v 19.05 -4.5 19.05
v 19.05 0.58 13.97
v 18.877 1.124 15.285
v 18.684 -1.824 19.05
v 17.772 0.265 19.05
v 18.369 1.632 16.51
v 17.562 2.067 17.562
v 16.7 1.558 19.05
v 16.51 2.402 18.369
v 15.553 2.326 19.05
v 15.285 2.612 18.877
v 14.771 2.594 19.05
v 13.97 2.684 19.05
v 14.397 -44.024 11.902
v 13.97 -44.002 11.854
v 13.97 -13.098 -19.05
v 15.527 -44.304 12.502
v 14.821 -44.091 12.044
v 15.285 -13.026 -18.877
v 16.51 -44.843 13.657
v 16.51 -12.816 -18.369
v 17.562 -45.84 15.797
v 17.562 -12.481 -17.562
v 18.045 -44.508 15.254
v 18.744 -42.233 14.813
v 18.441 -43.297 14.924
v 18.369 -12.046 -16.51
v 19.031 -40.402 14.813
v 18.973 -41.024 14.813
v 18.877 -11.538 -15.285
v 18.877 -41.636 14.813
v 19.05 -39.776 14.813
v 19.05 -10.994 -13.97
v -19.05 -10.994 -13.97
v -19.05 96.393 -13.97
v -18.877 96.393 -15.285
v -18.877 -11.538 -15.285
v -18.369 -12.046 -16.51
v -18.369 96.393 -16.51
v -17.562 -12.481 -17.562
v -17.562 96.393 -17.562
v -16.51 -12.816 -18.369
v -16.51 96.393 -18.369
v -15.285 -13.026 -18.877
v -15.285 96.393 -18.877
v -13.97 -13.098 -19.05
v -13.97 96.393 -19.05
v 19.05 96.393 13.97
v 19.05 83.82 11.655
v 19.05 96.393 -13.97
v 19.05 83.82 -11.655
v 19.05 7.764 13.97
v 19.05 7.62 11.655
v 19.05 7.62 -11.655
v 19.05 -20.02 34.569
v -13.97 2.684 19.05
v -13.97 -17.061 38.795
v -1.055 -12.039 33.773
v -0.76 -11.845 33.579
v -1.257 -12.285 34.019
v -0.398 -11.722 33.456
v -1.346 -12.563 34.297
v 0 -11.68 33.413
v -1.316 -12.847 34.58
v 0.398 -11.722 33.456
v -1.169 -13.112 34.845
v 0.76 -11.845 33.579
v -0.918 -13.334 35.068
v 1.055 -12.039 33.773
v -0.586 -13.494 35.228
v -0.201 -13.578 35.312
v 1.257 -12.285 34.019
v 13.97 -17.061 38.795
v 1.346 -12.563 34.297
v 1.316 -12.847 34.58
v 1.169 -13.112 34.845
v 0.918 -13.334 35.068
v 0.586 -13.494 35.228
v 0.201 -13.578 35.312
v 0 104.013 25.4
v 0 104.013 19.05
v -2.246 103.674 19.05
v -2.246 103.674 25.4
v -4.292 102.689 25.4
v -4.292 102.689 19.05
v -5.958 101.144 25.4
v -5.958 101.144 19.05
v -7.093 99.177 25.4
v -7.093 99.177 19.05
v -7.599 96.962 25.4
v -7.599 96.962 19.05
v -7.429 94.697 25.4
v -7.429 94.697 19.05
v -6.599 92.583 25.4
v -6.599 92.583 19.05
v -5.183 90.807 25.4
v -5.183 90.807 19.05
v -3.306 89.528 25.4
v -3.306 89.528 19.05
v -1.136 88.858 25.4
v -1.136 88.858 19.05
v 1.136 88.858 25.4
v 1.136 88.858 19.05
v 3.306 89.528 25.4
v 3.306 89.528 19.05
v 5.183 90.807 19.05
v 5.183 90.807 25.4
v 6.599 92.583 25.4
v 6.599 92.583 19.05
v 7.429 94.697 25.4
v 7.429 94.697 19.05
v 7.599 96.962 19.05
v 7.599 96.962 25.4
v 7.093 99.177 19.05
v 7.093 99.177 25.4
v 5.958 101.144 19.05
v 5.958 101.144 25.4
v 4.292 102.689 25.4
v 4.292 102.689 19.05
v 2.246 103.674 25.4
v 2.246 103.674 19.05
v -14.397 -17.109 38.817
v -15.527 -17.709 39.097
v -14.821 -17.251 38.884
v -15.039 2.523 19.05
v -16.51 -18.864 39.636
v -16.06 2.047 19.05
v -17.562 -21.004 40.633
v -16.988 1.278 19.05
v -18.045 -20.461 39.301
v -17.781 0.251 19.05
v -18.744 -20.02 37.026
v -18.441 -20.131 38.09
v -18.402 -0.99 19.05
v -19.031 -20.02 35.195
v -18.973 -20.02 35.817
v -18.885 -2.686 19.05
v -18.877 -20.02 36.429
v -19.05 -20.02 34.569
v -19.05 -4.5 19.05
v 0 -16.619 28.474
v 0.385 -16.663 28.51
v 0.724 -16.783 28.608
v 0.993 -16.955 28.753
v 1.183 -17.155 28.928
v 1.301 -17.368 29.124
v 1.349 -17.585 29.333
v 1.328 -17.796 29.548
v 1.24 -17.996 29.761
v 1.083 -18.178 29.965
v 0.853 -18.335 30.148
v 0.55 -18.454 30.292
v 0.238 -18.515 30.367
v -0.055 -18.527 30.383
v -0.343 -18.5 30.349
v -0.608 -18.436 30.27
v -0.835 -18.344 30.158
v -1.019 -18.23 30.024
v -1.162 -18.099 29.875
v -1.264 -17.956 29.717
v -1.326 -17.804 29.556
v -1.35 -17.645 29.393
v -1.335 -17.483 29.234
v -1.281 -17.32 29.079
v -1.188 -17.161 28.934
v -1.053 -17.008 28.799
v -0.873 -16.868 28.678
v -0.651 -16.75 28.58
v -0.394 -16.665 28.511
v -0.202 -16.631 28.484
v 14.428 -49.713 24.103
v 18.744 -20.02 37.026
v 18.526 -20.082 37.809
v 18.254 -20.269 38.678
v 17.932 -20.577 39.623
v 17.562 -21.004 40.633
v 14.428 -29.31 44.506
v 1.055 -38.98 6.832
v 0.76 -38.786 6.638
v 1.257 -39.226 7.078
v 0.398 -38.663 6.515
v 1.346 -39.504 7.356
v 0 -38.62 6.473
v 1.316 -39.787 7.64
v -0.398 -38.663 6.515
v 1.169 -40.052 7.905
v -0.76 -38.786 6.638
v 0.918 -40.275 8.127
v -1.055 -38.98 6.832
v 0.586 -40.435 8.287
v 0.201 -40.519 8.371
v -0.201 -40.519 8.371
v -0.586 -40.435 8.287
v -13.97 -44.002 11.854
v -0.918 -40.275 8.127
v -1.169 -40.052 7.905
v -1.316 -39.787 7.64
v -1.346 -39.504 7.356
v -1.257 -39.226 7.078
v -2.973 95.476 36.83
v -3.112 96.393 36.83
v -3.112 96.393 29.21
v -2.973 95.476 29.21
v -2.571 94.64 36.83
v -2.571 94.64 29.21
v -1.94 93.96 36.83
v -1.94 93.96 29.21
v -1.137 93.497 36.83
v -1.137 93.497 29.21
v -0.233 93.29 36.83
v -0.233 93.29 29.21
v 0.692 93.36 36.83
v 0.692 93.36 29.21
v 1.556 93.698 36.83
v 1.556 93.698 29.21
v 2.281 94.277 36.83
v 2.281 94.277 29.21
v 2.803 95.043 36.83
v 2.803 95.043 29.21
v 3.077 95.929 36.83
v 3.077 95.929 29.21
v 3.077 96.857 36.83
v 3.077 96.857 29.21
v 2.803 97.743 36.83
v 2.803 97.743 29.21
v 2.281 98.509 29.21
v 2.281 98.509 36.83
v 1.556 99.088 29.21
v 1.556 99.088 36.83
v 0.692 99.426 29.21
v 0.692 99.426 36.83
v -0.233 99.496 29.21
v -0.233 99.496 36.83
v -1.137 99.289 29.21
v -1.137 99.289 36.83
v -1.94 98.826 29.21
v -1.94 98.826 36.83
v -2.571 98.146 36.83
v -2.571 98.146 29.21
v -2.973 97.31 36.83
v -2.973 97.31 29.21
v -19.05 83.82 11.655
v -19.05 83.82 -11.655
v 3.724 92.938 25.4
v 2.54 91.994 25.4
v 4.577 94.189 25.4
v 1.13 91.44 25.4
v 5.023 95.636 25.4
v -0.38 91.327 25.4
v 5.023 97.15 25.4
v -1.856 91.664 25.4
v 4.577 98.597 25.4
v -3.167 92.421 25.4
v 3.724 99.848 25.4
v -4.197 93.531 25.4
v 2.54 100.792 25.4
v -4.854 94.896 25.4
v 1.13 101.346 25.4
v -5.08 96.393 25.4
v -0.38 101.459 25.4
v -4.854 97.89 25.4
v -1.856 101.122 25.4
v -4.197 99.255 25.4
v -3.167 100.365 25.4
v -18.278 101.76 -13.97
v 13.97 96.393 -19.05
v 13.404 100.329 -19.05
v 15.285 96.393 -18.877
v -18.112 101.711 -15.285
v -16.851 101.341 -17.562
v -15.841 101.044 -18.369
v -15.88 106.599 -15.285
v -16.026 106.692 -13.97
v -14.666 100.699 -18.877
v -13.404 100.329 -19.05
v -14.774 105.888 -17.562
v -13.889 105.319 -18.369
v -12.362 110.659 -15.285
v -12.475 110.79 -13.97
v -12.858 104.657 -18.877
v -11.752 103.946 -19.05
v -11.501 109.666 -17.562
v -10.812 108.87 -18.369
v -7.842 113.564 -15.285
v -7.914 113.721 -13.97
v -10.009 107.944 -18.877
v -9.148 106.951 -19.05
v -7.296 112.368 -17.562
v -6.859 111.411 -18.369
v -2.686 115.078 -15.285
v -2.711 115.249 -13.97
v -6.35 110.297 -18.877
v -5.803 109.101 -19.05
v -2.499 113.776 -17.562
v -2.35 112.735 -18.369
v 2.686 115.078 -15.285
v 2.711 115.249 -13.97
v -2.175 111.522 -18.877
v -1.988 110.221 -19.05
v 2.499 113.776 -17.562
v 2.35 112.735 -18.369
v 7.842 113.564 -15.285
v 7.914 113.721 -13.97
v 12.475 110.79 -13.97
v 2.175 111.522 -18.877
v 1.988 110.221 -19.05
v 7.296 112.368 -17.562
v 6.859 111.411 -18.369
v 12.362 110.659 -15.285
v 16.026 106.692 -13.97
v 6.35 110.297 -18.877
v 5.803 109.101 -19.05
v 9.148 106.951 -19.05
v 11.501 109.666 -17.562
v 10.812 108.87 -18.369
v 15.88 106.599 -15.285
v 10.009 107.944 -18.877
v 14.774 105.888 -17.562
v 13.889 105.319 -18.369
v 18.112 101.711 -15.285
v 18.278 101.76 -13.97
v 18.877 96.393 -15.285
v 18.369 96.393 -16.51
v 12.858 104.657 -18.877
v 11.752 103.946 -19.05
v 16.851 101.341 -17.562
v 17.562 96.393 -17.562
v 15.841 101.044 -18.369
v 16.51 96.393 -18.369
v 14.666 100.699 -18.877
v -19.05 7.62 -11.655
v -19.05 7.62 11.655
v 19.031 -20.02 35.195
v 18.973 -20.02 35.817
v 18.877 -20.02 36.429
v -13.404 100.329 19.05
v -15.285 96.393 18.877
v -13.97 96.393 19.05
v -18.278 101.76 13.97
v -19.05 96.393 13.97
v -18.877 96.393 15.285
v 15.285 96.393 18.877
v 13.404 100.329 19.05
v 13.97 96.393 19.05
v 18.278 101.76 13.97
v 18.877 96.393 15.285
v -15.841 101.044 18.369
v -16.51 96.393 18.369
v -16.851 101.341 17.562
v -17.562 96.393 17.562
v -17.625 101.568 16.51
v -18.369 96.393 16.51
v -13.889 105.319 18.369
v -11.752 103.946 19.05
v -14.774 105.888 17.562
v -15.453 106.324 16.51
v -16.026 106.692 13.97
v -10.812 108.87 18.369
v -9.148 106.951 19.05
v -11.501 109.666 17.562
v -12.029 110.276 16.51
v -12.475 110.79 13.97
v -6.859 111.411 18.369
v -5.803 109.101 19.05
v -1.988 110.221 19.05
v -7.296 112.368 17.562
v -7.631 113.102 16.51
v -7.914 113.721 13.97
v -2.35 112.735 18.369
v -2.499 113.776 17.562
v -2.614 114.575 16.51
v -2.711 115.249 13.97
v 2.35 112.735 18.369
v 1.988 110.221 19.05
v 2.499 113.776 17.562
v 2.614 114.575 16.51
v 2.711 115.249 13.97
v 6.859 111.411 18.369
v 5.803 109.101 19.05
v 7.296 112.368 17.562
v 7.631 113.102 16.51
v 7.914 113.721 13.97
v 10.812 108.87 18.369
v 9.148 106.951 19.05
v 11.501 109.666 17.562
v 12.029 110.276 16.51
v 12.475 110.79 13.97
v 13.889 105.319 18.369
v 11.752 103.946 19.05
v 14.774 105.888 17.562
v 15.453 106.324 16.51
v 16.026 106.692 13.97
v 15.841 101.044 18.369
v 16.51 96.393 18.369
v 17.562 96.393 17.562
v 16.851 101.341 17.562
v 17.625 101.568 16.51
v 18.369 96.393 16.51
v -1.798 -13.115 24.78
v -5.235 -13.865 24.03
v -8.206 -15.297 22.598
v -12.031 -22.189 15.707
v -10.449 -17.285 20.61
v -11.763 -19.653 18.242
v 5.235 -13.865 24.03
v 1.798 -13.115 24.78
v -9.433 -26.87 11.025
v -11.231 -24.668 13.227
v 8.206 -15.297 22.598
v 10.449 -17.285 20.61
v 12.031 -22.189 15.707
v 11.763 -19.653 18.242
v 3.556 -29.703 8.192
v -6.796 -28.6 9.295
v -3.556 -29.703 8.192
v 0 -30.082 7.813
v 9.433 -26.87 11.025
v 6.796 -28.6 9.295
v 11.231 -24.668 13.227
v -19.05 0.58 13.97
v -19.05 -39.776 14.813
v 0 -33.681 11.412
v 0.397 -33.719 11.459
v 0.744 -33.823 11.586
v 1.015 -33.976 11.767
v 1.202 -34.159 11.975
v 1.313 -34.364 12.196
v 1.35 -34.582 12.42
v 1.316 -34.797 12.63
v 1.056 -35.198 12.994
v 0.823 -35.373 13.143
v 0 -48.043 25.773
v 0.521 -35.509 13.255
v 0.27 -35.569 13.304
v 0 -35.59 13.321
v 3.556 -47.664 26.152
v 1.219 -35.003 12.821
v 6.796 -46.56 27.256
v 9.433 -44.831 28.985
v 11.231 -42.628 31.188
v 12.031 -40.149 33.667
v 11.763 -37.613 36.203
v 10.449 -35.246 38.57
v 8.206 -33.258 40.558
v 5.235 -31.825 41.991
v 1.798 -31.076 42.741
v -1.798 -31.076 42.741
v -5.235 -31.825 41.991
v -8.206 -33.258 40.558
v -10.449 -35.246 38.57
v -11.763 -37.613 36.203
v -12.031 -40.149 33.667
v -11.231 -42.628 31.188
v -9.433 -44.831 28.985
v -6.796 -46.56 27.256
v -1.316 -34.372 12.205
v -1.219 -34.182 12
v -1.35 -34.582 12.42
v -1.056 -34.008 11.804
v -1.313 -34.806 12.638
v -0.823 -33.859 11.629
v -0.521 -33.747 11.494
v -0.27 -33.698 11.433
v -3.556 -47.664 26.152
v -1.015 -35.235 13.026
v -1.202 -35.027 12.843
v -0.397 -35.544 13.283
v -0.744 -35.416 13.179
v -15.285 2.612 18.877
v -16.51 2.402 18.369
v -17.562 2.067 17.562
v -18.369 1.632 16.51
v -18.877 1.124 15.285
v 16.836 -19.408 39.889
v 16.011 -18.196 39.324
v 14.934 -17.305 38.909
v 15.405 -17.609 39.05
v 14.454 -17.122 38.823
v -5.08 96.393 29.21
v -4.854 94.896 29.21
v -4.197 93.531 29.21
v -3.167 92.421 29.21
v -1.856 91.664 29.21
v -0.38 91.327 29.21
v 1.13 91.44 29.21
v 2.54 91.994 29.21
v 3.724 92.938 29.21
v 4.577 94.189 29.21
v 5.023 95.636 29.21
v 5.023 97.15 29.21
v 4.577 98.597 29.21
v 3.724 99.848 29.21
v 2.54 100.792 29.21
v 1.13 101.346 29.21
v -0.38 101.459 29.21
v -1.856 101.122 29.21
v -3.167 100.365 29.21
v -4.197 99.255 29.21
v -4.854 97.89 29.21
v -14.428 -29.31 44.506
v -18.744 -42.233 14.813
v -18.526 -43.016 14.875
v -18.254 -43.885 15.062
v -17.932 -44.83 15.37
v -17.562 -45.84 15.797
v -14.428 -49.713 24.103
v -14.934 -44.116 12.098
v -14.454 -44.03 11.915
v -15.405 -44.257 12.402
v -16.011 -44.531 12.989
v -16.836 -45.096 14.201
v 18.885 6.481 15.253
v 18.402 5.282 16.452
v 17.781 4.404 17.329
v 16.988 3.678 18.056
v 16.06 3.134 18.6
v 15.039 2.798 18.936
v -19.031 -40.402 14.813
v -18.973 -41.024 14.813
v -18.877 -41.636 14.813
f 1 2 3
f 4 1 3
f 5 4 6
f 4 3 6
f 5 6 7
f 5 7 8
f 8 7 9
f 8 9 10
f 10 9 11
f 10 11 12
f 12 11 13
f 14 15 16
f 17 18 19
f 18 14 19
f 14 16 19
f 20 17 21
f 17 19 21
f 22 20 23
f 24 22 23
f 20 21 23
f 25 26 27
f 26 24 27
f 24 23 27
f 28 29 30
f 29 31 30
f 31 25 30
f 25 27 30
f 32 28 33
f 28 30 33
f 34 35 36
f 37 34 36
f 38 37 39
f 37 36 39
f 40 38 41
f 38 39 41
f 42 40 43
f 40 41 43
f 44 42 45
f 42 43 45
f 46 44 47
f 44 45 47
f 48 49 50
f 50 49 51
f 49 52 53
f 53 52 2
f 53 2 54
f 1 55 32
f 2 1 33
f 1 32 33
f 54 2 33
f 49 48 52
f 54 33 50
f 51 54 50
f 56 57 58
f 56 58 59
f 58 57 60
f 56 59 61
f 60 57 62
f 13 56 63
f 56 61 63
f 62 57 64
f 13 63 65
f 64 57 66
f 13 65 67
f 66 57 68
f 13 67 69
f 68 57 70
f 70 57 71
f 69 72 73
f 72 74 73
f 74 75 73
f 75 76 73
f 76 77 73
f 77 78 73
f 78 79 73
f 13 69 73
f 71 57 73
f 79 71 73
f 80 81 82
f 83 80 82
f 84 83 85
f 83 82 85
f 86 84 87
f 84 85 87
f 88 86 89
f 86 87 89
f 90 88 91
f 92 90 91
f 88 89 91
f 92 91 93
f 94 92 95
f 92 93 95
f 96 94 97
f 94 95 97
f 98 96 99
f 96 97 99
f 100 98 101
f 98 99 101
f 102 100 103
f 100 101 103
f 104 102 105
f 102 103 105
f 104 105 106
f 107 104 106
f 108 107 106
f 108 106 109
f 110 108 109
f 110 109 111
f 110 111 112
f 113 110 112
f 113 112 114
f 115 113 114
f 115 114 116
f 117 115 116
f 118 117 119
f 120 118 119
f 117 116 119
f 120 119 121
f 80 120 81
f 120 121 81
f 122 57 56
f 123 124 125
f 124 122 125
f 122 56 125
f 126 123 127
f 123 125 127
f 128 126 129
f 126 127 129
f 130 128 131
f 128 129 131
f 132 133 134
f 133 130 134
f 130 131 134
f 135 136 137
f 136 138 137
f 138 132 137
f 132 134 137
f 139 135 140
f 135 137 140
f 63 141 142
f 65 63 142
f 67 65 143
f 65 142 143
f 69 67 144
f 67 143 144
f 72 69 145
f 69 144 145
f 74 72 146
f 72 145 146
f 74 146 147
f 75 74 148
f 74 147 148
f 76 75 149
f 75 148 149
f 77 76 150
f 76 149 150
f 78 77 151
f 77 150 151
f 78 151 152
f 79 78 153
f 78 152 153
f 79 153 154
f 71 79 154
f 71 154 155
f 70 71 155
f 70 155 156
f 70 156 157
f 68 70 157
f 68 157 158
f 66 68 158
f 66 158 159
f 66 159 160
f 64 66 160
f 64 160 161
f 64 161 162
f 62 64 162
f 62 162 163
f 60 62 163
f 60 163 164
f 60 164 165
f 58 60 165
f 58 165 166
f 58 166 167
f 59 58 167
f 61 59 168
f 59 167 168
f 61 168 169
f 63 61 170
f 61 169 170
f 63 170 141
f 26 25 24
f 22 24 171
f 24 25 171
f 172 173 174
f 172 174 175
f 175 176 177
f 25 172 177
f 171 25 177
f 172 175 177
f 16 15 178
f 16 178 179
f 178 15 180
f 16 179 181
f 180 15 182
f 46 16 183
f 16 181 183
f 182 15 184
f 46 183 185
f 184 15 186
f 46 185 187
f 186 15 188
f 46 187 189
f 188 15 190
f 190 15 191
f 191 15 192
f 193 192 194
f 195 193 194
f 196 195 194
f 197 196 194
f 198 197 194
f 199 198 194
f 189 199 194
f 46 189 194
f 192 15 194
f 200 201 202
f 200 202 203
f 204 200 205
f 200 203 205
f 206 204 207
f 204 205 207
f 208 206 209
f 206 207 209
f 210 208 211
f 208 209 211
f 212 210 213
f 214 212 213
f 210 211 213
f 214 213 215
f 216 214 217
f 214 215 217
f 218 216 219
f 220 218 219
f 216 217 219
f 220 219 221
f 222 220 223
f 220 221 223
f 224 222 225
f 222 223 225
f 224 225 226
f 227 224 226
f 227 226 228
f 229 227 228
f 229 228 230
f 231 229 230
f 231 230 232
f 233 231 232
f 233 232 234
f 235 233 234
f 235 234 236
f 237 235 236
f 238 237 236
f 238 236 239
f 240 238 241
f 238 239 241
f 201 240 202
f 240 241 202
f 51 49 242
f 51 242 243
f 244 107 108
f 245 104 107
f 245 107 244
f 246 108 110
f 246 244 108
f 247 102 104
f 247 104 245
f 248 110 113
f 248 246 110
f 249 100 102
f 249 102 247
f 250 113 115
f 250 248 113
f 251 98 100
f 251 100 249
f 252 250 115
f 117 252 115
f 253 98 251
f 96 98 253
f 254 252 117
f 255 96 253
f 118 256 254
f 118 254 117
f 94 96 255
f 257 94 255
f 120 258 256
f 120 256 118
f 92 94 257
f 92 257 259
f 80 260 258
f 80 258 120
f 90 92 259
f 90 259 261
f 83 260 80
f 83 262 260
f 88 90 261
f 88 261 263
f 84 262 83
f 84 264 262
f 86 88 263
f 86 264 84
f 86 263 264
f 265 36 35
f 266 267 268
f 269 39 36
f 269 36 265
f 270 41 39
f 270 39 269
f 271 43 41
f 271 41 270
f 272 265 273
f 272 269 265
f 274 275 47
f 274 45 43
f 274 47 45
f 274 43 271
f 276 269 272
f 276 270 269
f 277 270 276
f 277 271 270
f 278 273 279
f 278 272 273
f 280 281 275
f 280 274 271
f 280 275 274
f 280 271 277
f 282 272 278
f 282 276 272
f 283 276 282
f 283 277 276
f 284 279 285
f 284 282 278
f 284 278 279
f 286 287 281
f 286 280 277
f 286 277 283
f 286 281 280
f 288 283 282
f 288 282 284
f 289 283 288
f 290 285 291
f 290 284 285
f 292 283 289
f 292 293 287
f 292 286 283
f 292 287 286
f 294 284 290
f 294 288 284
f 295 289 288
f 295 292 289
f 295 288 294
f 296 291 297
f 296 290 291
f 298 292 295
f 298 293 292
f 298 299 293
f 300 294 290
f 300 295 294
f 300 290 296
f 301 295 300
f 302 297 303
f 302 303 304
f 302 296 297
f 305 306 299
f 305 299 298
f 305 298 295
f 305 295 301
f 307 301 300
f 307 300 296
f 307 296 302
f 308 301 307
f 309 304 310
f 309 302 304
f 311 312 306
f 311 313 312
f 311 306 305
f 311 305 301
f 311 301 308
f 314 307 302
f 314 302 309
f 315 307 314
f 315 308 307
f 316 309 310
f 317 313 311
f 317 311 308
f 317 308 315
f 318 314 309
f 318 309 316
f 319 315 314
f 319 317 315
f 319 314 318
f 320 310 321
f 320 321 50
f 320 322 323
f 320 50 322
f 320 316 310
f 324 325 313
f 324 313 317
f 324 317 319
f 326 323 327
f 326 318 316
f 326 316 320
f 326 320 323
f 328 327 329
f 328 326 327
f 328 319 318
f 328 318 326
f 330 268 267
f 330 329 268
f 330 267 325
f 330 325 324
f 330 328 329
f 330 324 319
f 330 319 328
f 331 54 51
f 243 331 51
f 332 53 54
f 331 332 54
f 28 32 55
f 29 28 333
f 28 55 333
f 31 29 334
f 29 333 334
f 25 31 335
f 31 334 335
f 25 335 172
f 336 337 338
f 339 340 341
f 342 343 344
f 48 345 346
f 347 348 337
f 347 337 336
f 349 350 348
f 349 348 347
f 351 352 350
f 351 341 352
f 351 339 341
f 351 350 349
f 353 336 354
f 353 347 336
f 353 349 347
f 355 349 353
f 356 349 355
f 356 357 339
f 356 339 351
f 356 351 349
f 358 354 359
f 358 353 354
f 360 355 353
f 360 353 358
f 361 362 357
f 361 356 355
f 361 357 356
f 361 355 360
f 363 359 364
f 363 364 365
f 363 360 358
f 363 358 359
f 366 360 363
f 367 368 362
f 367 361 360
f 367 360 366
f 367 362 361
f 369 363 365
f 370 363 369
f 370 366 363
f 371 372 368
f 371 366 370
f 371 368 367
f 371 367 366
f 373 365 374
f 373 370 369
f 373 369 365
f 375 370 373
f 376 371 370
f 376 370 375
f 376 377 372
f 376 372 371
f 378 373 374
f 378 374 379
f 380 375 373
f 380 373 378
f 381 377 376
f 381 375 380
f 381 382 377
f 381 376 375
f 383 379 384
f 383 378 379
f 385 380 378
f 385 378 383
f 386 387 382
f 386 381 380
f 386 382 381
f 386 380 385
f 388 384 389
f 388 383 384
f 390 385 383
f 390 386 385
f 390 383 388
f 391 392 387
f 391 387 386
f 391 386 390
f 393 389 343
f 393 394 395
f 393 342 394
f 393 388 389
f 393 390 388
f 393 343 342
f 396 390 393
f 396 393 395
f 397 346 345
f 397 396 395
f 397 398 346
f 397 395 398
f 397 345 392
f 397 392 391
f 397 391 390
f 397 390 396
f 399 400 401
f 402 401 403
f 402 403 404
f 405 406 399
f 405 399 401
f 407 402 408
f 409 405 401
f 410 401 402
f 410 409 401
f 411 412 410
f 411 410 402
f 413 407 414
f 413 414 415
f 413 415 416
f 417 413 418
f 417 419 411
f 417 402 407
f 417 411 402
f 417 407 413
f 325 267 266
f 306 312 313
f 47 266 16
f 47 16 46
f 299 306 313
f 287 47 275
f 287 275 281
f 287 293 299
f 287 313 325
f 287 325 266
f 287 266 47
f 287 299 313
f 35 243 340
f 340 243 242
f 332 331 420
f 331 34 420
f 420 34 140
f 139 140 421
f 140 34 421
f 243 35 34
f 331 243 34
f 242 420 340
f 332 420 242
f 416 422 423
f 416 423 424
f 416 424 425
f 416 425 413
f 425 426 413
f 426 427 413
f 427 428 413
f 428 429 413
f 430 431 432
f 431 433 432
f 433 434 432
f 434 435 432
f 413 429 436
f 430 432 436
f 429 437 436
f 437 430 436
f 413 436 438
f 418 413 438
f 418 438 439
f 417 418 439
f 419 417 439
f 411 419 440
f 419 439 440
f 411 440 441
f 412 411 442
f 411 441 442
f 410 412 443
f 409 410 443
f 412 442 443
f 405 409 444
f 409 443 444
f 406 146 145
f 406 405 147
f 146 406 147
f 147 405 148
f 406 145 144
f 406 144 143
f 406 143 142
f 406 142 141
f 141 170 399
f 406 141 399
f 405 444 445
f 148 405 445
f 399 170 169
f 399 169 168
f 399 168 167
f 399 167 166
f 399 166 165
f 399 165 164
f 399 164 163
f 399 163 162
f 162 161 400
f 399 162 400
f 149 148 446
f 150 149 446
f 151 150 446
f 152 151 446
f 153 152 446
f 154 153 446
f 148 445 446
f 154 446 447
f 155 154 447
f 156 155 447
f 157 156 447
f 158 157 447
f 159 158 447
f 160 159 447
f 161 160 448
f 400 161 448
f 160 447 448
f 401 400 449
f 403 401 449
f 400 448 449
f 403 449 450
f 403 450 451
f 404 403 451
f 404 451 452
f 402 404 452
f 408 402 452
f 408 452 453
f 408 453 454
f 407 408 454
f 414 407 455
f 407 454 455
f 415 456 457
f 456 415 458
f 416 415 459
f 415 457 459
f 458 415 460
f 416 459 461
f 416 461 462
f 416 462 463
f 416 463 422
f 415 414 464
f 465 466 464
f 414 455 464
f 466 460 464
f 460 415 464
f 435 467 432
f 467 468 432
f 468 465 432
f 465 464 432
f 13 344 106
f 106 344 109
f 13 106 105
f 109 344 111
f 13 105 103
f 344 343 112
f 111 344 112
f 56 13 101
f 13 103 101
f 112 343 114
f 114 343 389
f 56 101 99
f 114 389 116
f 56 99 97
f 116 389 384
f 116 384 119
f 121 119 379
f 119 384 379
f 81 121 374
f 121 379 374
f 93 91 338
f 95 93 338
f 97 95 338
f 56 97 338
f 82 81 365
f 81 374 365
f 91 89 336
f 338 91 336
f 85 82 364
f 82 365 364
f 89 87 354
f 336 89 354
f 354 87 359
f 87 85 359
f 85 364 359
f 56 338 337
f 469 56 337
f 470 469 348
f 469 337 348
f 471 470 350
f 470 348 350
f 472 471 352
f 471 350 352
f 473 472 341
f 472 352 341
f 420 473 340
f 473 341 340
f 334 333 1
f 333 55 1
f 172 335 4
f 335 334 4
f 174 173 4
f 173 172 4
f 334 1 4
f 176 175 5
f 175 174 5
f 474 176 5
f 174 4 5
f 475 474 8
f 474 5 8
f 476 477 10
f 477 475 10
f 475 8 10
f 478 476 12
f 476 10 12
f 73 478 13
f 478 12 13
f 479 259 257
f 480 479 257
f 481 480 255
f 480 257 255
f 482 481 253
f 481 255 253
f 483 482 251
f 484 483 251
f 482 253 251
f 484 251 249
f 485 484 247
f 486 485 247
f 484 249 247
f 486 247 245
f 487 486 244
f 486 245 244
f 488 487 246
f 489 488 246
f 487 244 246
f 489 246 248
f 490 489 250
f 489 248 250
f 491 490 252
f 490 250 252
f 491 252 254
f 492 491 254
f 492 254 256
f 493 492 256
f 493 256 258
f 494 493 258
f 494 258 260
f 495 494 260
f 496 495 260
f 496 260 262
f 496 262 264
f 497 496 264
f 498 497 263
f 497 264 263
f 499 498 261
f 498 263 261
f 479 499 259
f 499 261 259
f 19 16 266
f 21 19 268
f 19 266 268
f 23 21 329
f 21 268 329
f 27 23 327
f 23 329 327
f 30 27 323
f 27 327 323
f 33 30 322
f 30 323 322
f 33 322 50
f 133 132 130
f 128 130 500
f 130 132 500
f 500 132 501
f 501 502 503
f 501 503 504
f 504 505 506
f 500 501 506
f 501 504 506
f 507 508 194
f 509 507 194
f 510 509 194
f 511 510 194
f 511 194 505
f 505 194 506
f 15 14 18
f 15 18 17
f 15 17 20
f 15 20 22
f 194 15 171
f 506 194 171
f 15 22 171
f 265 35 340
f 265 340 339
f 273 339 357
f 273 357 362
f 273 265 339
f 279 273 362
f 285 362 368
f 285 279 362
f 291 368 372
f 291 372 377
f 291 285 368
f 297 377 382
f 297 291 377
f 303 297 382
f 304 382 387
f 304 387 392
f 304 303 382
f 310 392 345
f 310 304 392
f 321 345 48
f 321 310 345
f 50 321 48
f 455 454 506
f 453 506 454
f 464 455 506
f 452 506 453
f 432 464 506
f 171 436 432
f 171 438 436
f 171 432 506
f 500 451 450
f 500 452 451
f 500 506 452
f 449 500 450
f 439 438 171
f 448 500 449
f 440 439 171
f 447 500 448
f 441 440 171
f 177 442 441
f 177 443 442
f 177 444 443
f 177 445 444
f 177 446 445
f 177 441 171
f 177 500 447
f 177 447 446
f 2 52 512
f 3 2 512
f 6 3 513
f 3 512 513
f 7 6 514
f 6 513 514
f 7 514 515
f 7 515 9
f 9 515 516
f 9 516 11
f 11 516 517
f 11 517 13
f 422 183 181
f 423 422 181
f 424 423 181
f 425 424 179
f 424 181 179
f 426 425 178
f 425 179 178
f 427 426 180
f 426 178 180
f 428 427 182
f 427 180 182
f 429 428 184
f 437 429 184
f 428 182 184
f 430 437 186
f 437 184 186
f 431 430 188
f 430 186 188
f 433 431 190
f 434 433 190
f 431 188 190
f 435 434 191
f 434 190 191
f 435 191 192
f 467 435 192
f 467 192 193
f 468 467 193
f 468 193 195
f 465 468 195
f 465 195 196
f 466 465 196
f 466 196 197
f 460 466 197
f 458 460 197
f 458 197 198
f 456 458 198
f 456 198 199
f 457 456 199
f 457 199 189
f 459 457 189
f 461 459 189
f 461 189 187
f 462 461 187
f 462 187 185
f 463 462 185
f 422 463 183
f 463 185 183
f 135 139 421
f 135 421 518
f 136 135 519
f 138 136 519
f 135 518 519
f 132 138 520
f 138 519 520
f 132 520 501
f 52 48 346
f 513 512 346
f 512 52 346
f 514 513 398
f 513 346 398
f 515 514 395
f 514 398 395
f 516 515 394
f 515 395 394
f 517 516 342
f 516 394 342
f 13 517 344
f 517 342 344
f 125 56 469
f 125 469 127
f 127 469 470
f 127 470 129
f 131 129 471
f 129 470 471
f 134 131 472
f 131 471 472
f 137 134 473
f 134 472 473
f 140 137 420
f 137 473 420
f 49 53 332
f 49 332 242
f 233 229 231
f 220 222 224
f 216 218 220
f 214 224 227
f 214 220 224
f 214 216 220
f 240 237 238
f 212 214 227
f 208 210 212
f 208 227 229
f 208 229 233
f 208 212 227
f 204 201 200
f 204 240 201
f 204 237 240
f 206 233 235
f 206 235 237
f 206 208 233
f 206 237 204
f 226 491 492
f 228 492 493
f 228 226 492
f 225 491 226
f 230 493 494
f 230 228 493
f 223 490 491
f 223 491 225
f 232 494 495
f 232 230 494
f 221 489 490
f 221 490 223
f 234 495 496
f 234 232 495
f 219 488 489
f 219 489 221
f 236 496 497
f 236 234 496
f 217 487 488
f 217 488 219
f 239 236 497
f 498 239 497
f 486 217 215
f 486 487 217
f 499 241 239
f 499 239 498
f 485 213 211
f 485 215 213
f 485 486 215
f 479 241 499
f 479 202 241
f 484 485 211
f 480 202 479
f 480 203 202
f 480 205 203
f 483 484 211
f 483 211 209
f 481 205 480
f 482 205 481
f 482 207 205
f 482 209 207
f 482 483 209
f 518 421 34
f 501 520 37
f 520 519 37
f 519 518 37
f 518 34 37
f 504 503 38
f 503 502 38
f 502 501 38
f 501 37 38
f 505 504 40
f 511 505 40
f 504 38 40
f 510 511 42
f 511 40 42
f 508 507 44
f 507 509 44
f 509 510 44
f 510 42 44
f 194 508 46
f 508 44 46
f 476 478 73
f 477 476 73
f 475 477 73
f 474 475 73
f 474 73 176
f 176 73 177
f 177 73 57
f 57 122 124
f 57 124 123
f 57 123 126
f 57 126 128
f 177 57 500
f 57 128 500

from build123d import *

# Parameters (mm, degrees)
SKETCH11_W          = 38.1
SKETCH11_H          = 38.1
SKETCH12_W          = 38.1
SKETCH12_H          = 38.1
BOSS_EXTRUDE5_DEPTH = 12.7
BOSS_EXTRUDE5_TAPER = 20
BOSS_EXTRUDE6_DEPTH = 38.1
SKETCH15_R          = 12.065
CUT_EXTRUDE3_DEPTH  = 25.4
SKETCH16_W          = 23.310601064
SKETCH16_H          = 76.2
CUT_EXTRUDE4_DEPTH  = 59.830675793
SKETCH17_R          = 7.62
BOSS_EXTRUDE7_DEPTH = 6.35
SKETCH18_R          = 5.08
BOSS_EXTRUDE8_DEPTH = 3.81
SKETCH19_R          = 3.1115
BOSS_EXTRUDE9_DEPTH = 7.62
FILLET2_R           = 5.08
SKETCH21_R          = 1.35
CUT_EXTRUDE5_DEPTH  = 63.348983198


with BuildPart() as part:
    # Sweep1: sweep along a path in Sketch10
    with BuildLine(Plane(origin=(0, 0, 0), x_dir=(0, 0, -1), z_dir=(1, 0, 0))) as sweep1_path:
        Line((0, 96.393), (0, -5.207))
        Line((0, -5.207), (-25.324322261, -30.531322261))
    # Sketch11 → Sweep1 (sweep)
    with BuildSketch(Plane(origin=(0, 96.393, 0), x_dir=(1, 0, 0), z_dir=(0, 1, 0))):
        Rectangle(SKETCH11_W, SKETCH11_H)
    sweep(path=sweep1_path.line, transition=Transition.RIGHT)

    # Sketch12 → Boss-Extrude5 (add)
    with BuildSketch(Plane(origin=(0, -27.927822261, 27.927822261), x_dir=(1, 0, 0), z_dir=(0, -0.7071067811865461, 0.7071067811865489))):
        with Locations((0, -3.68190501)):
            Rectangle(SKETCH12_W, SKETCH12_H)
    extrude(amount=BOSS_EXTRUDE5_DEPTH, taper=BOSS_EXTRUDE5_TAPER)

    # Sketch13 → Boss-Extrude6 (add)
    with BuildSketch(Plane(origin=(0, 0, -19.05), x_dir=(-1, 0, 0), z_dir=(0, 0, -1))):
        with BuildLine():
            Line((-19.05, 96.393), (19.05, 96.393))
            ThreePointArc((19.05, 96.393), (0, 115.443), (-19.05, 96.393))
        make_face()
    extrude(amount=-BOSS_EXTRUDE6_DEPTH)

    # Sketch15 → Cut-Extrude3 (cut)
    with BuildSketch(Plane(origin=(0, -36.908078382, 36.908078382), x_dir=(1, 0, 0), z_dir=(0, -0.7071067811865461, 0.7071067811865489))):
        with Locations(Location((0, -3.68190501, 0), (0, 0, 270))):
            Circle(SKETCH15_R)
    extrude(amount=-CUT_EXTRUDE3_DEPTH, mode=Mode.SUBTRACT)

    # Sketch16 → Cut-Extrude4 (cut)
    with BuildSketch(Plane(origin=(19.05, 0, 0), x_dir=(0, 0, -1), z_dir=(1, 0, 0))):
        with Locations((0, 45.72)):
            Rectangle(SKETCH16_W, SKETCH16_H)
    extrude(amount=-CUT_EXTRUDE4_DEPTH, mode=Mode.SUBTRACT)

    # Sketch17 → Boss-Extrude7 (add)
    with BuildSketch(Plane.XY.offset(19.05)):
        with Locations(Location((0, 96.393, 0), (0, 0, 90))):
            Circle(SKETCH17_R)
    extrude(amount=BOSS_EXTRUDE7_DEPTH)

    # Sketch18 → Boss-Extrude8 (add)
    with BuildSketch(Plane.XY.offset(25.4)):
        with Locations(Location((0, 96.393, 0), (0, 0, 180))):
            Circle(SKETCH18_R)
    extrude(amount=BOSS_EXTRUDE8_DEPTH)

    # Sketch19 → Boss-Extrude9 (add)
    with BuildSketch(Plane.XY.offset(29.21)):
        with Locations(Location((0, 96.393, 0), (0, 0, 180))):
            Circle(SKETCH19_R)
    extrude(amount=BOSS_EXTRUDE9_DEPTH)

    # Fillet2
    # the kernel refuses this fillet: 5.08 mm, written as the material it takes off along each edge
    with BuildSketch(Plane(origin=(19.05, 96.393, 19.05), x_dir=(-1, 0, 0), z_dir=(0, -1, 0))) as fillet2_piece_1_section:
        with BuildLine():
            CenterArc((FILLET2_R, FILLET2_R), FILLET2_R, 180, 90)
            Line((0, FILLET2_R), (0, 0))
            Line((0, 0), (FILLET2_R, 0))
        make_face()
    fillet2_piece_1 = extrude(amount=106.409231637, mode=Mode.PRIVATE)
    fillet2_piece_1 = split(fillet2_piece_1, bisect_by=Plane(origin=(17.892257619, 26.96392305, -5.230154687), z_dir=(0, 0.7071067811865489, 0.7071067811865462)), keep=Keep.TOP, mode=Mode.PRIVATE)
    add(fillet2_piece_1, mode=Mode.SUBTRACT)
    with BuildSketch(Plane(origin=(19.05, 96.393, -19.05), x_dir=(0, 0, 1), z_dir=(0, -1, 0))) as fillet2_piece_2:
        with BuildLine():
            CenterArc((FILLET2_R, FILLET2_R), FILLET2_R, 180, 90)
            Line((0, FILLET2_R), (0, 0))
            Line((0, 0), (FILLET2_R, 0))
        make_face()
    extrude(amount=122.190768363, mode=Mode.SUBTRACT)
    with BuildSketch(Plane(origin=(19.05, 11.664024484, 10.069743879), x_dir=(-1, 0, 0), z_dir=(0, -0.7071067811865462, 0.7071067811865489))) as fillet2_piece_3_section:
        with BuildLine():
            CenterArc((FILLET2_R, FILLET2_R), FILLET2_R, 180, 90)
            Line((0, FILLET2_R), (0, 0))
            Line((0, 0), (FILLET2_R, 0))
        make_face()
    fillet2_piece_3 = extrude(amount=53.323231637, mode=Mode.PRIVATE)
    fillet2_piece_3 = split(fillet2_piece_3, bisect_by=Plane(origin=(17.881962417, -12.866336341, 19.05), z_dir=(0, 0, 1)), keep=Keep.TOP, mode=Mode.PRIVATE)
    add(fillet2_piece_3, mode=Mode.SUBTRACT)
    with BuildSketch(Plane(origin=(19.05, -4.117512242, -28.030256121), x_dir=(0, 0.7071067811865489, 0.7071067811865462), z_dir=(0, -0.7071067811865462, 0.7071067811865489))) as fillet2_piece_4:
        with BuildLine():
            CenterArc((FILLET2_R, FILLET2_R), FILLET2_R, 180, 90)
            Line((0, FILLET2_R), (0, 0))
            Line((0, 0), (FILLET2_R, 0))
        make_face()
    extrude(amount=69.104768363, mode=Mode.SUBTRACT)
    with BuildSketch(Plane(origin=(-19.05, -4.117512242, -28.030256121), x_dir=(0, 0.7071067811865488, 0.7071067811865461), z_dir=(0, -0.7071067811865462, 0.7071067811865489))) as fillet2_piece_5:
        with BuildLine():
            CenterArc((FILLET2_R, -FILLET2_R), FILLET2_R, 90, 90)
            Line((0, -FILLET2_R), (0, 0))
            Line((0, 0), (FILLET2_R, 0))
        make_face()
    extrude(amount=69.104768363, mode=Mode.SUBTRACT)
    with BuildSketch(Plane(origin=(-19.05, 11.664024484, 10.069743879), x_dir=(0, -0.7071067811865489, -0.7071067811865462), z_dir=(0, -0.7071067811865462, 0.7071067811865489))) as fillet2_piece_6_section:
        with BuildLine():
            CenterArc((FILLET2_R, FILLET2_R), FILLET2_R, 180, 90)
            Line((0, FILLET2_R), (0, 0))
            Line((0, 0), (FILLET2_R, 0))
        make_face()
    fillet2_piece_6 = extrude(amount=53.323231637, mode=Mode.PRIVATE)
    fillet2_piece_6 = split(fillet2_piece_6, bisect_by=Plane(origin=(-17.881962417, -12.866336341, 19.05), z_dir=(0, 0, 1)), keep=Keep.TOP, mode=Mode.PRIVATE)
    add(fillet2_piece_6, mode=Mode.SUBTRACT)
    with BuildSketch(Plane(origin=(19.05, -15.477476632, 40.378167891), x_dir=(0, 0.7071067811865461, -0.7071067811865488), z_dir=(0, -0.7071067811865489, -0.7071067811865462)), Plane(origin=(-19.05, -45.585167891, 10.270476632), x_dir=(0, 0.7071067811865461, -0.7071067811865489), z_dir=(0, 0.7071067811865489, 0.7071067811865462))) as fillet2_piece_7:
        with BuildLine():
            CenterArc((FILLET2_R * 0.176326980708, -FILLET2_R), FILLET2_R, 90, 20)
            Line((-FILLET2_R * 0.165693162617, -FILLET2_R * 0.0603073792141), (0, 0))
            Line((0, 0), (FILLET2_R * 0.176326980708, 0))
        make_face()
    extrude(amount=42.57870531, mode=Mode.SUBTRACT)
    with BuildSketch(Plane(origin=(-19.05, 96.393, -19.05), x_dir=(0, 0, 1), z_dir=(0, -1, 0))) as fillet2_piece_8:
        with BuildLine():
            CenterArc((FILLET2_R, -FILLET2_R), FILLET2_R, 90, 90)
            Line((0, -FILLET2_R), (0, 0))
            Line((0, 0), (FILLET2_R, 0))
        make_face()
    extrude(amount=122.190768363, mode=Mode.SUBTRACT)
    with BuildSketch(Plane(origin=(-19.05, 96.393, 19.05), x_dir=(1, 0, 0), z_dir=(0, -1, 0))) as fillet2_piece_9_section:
        with BuildLine():
            CenterArc((FILLET2_R, -FILLET2_R), FILLET2_R, 90, 90)
            Line((0, -FILLET2_R), (0, 0))
            Line((0, 0), (FILLET2_R, 0))
        make_face()
    fillet2_piece_9 = extrude(amount=106.409231637, mode=Mode.PRIVATE)
    fillet2_piece_9 = split(fillet2_piece_9, bisect_by=Plane(origin=(-17.892257619, 26.96392305, -5.230154687), z_dir=(0, 0.7071067811865489, 0.7071067811865462)), keep=Keep.TOP, mode=Mode.PRIVATE)
    add(fillet2_piece_9, mode=Mode.SUBTRACT)
    with BuildSketch(Plane(origin=(0, 96.393, -19.05), x_dir=(-1, 0, 0), z_dir=(0, -1, 0))) as fillet2_piece_10:
        with BuildLine():
            CenterArc((19.05 - FILLET2_R, -FILLET2_R), FILLET2_R, 0, 90)
            Line((19.05 - FILLET2_R, 0), (19.05, 0))
            Line((19.05, 0), (19.05, -FILLET2_R))
        make_face()
    revolve(axis=Axis((0, 96.393, -19.05), (0, 0, -1)), revolution_arc=180, mode=Mode.SUBTRACT)
    with BuildSketch(Plane(origin=(0, 96.393, 19.05), x_dir=(-1, 0, 0), z_dir=(0, -1, 0))) as fillet2_piece_11:
        with BuildLine():
            CenterArc((19.05 - FILLET2_R, FILLET2_R), FILLET2_R, 270, 90)
            Line((19.05, FILLET2_R), (19.05, 0))
            Line((19.05, 0), (19.05 - FILLET2_R, 0))
        make_face()
    revolve(axis=Axis((0, 96.393, 19.05), (0, 0, -1)), revolution_arc=180, mode=Mode.SUBTRACT)
    with BuildSketch(Plane(origin=(19.05, 96.393, 19.05), x_dir=(-1, 0, 0), z_dir=(0, -1, 0))) as fillet2_piece_12a_section:
        with BuildLine():
            CenterArc((FILLET2_R, FILLET2_R), FILLET2_R, 180, 90)
            Line((0, FILLET2_R), (0, 0))
            Line((0, 0), (FILLET2_R, 0))
        make_face()
    fillet2_piece_12a = extrude(amount=106.409231637, mode=Mode.PRIVATE)
    fillet2_piece_12a = split(fillet2_piece_12a, bisect_by=Plane(origin=(17.951071981, 0.436282509, 21.297485854), z_dir=(0, -0.7071067811865489, -0.7071067811865462)), keep=Keep.TOP, mode=Mode.PRIVATE)
    with BuildSketch(Plane(origin=(19.05, 11.664024484, 10.069743879), x_dir=(-1, 0, 0), z_dir=(0, -0.7071067811865462, 0.7071067811865489))) as fillet2_piece_12b_section:
        with BuildLine():
            CenterArc((FILLET2_R, FILLET2_R), FILLET2_R, 180, 90)
            Line((0, FILLET2_R), (0, 0))
            Line((0, 0), (FILLET2_R, 0))
        make_face()
    fillet2_piece_12b = extrude(amount=53.323231637, mode=Mode.PRIVATE)
    fillet2_piece_12b = split(fillet2_piece_12b, bisect_by=Plane(origin=(17.951071981, 5.862193339, 19.05), z_dir=(0, 0, -1)), keep=Keep.TOP, mode=Mode.PRIVATE)
    fillet2_piece_12 = fillet2_piece_12a & fillet2_piece_12b
    add(fillet2_piece_12, mode=Mode.SUBTRACT)
    with BuildSketch(Plane(origin=(-19.05, 96.393, 19.05), x_dir=(1, 0, 0), z_dir=(0, -1, 0))) as fillet2_piece_13a_section:
        with BuildLine():
            CenterArc((FILLET2_R, -FILLET2_R), FILLET2_R, 90, 90)
            Line((0, -FILLET2_R), (0, 0))
            Line((0, 0), (FILLET2_R, 0))
        make_face()
    fillet2_piece_13a = extrude(amount=106.409231637, mode=Mode.PRIVATE)
    fillet2_piece_13a = split(fillet2_piece_13a, bisect_by=Plane(origin=(-17.951071981, 0.436282509, 21.297485854), z_dir=(0, -0.7071067811865489, -0.7071067811865462)), keep=Keep.TOP, mode=Mode.PRIVATE)
    with BuildSketch(Plane(origin=(-19.05, 11.664024484, 10.069743879), x_dir=(0, -0.7071067811865489, -0.7071067811865462), z_dir=(0, -0.7071067811865462, 0.7071067811865489))) as fillet2_piece_13b_section:
        with BuildLine():
            CenterArc((FILLET2_R, FILLET2_R), FILLET2_R, 180, 90)
            Line((0, FILLET2_R), (0, 0))
            Line((0, 0), (FILLET2_R, 0))
        make_face()
    fillet2_piece_13b = extrude(amount=53.323231637, mode=Mode.PRIVATE)
    fillet2_piece_13b = split(fillet2_piece_13b, bisect_by=Plane(origin=(-17.951071981, 5.862193339, 19.05), z_dir=(0, 0, -1)), keep=Keep.TOP, mode=Mode.PRIVATE)
    fillet2_piece_13 = fillet2_piece_13a & fillet2_piece_13b
    add(fillet2_piece_13, mode=Mode.SUBTRACT)

    # Sketch21 → Cut-Extrude5 (cut)
    with BuildSketch(Plane(origin=(0, -16.073884182, -16.073884182), x_dir=(1, 0, 0), z_dir=(0, -0.7071067811865486, -0.7071067811865465))):
        with Locations(Location((0, 33.23557837, 0), (0, 0, 270))):
            Circle(SKETCH21_R)
    extrude(amount=-CUT_EXTRUDE5_DEPTH, mode=Mode.SUBTRACT)


solid = part.part
